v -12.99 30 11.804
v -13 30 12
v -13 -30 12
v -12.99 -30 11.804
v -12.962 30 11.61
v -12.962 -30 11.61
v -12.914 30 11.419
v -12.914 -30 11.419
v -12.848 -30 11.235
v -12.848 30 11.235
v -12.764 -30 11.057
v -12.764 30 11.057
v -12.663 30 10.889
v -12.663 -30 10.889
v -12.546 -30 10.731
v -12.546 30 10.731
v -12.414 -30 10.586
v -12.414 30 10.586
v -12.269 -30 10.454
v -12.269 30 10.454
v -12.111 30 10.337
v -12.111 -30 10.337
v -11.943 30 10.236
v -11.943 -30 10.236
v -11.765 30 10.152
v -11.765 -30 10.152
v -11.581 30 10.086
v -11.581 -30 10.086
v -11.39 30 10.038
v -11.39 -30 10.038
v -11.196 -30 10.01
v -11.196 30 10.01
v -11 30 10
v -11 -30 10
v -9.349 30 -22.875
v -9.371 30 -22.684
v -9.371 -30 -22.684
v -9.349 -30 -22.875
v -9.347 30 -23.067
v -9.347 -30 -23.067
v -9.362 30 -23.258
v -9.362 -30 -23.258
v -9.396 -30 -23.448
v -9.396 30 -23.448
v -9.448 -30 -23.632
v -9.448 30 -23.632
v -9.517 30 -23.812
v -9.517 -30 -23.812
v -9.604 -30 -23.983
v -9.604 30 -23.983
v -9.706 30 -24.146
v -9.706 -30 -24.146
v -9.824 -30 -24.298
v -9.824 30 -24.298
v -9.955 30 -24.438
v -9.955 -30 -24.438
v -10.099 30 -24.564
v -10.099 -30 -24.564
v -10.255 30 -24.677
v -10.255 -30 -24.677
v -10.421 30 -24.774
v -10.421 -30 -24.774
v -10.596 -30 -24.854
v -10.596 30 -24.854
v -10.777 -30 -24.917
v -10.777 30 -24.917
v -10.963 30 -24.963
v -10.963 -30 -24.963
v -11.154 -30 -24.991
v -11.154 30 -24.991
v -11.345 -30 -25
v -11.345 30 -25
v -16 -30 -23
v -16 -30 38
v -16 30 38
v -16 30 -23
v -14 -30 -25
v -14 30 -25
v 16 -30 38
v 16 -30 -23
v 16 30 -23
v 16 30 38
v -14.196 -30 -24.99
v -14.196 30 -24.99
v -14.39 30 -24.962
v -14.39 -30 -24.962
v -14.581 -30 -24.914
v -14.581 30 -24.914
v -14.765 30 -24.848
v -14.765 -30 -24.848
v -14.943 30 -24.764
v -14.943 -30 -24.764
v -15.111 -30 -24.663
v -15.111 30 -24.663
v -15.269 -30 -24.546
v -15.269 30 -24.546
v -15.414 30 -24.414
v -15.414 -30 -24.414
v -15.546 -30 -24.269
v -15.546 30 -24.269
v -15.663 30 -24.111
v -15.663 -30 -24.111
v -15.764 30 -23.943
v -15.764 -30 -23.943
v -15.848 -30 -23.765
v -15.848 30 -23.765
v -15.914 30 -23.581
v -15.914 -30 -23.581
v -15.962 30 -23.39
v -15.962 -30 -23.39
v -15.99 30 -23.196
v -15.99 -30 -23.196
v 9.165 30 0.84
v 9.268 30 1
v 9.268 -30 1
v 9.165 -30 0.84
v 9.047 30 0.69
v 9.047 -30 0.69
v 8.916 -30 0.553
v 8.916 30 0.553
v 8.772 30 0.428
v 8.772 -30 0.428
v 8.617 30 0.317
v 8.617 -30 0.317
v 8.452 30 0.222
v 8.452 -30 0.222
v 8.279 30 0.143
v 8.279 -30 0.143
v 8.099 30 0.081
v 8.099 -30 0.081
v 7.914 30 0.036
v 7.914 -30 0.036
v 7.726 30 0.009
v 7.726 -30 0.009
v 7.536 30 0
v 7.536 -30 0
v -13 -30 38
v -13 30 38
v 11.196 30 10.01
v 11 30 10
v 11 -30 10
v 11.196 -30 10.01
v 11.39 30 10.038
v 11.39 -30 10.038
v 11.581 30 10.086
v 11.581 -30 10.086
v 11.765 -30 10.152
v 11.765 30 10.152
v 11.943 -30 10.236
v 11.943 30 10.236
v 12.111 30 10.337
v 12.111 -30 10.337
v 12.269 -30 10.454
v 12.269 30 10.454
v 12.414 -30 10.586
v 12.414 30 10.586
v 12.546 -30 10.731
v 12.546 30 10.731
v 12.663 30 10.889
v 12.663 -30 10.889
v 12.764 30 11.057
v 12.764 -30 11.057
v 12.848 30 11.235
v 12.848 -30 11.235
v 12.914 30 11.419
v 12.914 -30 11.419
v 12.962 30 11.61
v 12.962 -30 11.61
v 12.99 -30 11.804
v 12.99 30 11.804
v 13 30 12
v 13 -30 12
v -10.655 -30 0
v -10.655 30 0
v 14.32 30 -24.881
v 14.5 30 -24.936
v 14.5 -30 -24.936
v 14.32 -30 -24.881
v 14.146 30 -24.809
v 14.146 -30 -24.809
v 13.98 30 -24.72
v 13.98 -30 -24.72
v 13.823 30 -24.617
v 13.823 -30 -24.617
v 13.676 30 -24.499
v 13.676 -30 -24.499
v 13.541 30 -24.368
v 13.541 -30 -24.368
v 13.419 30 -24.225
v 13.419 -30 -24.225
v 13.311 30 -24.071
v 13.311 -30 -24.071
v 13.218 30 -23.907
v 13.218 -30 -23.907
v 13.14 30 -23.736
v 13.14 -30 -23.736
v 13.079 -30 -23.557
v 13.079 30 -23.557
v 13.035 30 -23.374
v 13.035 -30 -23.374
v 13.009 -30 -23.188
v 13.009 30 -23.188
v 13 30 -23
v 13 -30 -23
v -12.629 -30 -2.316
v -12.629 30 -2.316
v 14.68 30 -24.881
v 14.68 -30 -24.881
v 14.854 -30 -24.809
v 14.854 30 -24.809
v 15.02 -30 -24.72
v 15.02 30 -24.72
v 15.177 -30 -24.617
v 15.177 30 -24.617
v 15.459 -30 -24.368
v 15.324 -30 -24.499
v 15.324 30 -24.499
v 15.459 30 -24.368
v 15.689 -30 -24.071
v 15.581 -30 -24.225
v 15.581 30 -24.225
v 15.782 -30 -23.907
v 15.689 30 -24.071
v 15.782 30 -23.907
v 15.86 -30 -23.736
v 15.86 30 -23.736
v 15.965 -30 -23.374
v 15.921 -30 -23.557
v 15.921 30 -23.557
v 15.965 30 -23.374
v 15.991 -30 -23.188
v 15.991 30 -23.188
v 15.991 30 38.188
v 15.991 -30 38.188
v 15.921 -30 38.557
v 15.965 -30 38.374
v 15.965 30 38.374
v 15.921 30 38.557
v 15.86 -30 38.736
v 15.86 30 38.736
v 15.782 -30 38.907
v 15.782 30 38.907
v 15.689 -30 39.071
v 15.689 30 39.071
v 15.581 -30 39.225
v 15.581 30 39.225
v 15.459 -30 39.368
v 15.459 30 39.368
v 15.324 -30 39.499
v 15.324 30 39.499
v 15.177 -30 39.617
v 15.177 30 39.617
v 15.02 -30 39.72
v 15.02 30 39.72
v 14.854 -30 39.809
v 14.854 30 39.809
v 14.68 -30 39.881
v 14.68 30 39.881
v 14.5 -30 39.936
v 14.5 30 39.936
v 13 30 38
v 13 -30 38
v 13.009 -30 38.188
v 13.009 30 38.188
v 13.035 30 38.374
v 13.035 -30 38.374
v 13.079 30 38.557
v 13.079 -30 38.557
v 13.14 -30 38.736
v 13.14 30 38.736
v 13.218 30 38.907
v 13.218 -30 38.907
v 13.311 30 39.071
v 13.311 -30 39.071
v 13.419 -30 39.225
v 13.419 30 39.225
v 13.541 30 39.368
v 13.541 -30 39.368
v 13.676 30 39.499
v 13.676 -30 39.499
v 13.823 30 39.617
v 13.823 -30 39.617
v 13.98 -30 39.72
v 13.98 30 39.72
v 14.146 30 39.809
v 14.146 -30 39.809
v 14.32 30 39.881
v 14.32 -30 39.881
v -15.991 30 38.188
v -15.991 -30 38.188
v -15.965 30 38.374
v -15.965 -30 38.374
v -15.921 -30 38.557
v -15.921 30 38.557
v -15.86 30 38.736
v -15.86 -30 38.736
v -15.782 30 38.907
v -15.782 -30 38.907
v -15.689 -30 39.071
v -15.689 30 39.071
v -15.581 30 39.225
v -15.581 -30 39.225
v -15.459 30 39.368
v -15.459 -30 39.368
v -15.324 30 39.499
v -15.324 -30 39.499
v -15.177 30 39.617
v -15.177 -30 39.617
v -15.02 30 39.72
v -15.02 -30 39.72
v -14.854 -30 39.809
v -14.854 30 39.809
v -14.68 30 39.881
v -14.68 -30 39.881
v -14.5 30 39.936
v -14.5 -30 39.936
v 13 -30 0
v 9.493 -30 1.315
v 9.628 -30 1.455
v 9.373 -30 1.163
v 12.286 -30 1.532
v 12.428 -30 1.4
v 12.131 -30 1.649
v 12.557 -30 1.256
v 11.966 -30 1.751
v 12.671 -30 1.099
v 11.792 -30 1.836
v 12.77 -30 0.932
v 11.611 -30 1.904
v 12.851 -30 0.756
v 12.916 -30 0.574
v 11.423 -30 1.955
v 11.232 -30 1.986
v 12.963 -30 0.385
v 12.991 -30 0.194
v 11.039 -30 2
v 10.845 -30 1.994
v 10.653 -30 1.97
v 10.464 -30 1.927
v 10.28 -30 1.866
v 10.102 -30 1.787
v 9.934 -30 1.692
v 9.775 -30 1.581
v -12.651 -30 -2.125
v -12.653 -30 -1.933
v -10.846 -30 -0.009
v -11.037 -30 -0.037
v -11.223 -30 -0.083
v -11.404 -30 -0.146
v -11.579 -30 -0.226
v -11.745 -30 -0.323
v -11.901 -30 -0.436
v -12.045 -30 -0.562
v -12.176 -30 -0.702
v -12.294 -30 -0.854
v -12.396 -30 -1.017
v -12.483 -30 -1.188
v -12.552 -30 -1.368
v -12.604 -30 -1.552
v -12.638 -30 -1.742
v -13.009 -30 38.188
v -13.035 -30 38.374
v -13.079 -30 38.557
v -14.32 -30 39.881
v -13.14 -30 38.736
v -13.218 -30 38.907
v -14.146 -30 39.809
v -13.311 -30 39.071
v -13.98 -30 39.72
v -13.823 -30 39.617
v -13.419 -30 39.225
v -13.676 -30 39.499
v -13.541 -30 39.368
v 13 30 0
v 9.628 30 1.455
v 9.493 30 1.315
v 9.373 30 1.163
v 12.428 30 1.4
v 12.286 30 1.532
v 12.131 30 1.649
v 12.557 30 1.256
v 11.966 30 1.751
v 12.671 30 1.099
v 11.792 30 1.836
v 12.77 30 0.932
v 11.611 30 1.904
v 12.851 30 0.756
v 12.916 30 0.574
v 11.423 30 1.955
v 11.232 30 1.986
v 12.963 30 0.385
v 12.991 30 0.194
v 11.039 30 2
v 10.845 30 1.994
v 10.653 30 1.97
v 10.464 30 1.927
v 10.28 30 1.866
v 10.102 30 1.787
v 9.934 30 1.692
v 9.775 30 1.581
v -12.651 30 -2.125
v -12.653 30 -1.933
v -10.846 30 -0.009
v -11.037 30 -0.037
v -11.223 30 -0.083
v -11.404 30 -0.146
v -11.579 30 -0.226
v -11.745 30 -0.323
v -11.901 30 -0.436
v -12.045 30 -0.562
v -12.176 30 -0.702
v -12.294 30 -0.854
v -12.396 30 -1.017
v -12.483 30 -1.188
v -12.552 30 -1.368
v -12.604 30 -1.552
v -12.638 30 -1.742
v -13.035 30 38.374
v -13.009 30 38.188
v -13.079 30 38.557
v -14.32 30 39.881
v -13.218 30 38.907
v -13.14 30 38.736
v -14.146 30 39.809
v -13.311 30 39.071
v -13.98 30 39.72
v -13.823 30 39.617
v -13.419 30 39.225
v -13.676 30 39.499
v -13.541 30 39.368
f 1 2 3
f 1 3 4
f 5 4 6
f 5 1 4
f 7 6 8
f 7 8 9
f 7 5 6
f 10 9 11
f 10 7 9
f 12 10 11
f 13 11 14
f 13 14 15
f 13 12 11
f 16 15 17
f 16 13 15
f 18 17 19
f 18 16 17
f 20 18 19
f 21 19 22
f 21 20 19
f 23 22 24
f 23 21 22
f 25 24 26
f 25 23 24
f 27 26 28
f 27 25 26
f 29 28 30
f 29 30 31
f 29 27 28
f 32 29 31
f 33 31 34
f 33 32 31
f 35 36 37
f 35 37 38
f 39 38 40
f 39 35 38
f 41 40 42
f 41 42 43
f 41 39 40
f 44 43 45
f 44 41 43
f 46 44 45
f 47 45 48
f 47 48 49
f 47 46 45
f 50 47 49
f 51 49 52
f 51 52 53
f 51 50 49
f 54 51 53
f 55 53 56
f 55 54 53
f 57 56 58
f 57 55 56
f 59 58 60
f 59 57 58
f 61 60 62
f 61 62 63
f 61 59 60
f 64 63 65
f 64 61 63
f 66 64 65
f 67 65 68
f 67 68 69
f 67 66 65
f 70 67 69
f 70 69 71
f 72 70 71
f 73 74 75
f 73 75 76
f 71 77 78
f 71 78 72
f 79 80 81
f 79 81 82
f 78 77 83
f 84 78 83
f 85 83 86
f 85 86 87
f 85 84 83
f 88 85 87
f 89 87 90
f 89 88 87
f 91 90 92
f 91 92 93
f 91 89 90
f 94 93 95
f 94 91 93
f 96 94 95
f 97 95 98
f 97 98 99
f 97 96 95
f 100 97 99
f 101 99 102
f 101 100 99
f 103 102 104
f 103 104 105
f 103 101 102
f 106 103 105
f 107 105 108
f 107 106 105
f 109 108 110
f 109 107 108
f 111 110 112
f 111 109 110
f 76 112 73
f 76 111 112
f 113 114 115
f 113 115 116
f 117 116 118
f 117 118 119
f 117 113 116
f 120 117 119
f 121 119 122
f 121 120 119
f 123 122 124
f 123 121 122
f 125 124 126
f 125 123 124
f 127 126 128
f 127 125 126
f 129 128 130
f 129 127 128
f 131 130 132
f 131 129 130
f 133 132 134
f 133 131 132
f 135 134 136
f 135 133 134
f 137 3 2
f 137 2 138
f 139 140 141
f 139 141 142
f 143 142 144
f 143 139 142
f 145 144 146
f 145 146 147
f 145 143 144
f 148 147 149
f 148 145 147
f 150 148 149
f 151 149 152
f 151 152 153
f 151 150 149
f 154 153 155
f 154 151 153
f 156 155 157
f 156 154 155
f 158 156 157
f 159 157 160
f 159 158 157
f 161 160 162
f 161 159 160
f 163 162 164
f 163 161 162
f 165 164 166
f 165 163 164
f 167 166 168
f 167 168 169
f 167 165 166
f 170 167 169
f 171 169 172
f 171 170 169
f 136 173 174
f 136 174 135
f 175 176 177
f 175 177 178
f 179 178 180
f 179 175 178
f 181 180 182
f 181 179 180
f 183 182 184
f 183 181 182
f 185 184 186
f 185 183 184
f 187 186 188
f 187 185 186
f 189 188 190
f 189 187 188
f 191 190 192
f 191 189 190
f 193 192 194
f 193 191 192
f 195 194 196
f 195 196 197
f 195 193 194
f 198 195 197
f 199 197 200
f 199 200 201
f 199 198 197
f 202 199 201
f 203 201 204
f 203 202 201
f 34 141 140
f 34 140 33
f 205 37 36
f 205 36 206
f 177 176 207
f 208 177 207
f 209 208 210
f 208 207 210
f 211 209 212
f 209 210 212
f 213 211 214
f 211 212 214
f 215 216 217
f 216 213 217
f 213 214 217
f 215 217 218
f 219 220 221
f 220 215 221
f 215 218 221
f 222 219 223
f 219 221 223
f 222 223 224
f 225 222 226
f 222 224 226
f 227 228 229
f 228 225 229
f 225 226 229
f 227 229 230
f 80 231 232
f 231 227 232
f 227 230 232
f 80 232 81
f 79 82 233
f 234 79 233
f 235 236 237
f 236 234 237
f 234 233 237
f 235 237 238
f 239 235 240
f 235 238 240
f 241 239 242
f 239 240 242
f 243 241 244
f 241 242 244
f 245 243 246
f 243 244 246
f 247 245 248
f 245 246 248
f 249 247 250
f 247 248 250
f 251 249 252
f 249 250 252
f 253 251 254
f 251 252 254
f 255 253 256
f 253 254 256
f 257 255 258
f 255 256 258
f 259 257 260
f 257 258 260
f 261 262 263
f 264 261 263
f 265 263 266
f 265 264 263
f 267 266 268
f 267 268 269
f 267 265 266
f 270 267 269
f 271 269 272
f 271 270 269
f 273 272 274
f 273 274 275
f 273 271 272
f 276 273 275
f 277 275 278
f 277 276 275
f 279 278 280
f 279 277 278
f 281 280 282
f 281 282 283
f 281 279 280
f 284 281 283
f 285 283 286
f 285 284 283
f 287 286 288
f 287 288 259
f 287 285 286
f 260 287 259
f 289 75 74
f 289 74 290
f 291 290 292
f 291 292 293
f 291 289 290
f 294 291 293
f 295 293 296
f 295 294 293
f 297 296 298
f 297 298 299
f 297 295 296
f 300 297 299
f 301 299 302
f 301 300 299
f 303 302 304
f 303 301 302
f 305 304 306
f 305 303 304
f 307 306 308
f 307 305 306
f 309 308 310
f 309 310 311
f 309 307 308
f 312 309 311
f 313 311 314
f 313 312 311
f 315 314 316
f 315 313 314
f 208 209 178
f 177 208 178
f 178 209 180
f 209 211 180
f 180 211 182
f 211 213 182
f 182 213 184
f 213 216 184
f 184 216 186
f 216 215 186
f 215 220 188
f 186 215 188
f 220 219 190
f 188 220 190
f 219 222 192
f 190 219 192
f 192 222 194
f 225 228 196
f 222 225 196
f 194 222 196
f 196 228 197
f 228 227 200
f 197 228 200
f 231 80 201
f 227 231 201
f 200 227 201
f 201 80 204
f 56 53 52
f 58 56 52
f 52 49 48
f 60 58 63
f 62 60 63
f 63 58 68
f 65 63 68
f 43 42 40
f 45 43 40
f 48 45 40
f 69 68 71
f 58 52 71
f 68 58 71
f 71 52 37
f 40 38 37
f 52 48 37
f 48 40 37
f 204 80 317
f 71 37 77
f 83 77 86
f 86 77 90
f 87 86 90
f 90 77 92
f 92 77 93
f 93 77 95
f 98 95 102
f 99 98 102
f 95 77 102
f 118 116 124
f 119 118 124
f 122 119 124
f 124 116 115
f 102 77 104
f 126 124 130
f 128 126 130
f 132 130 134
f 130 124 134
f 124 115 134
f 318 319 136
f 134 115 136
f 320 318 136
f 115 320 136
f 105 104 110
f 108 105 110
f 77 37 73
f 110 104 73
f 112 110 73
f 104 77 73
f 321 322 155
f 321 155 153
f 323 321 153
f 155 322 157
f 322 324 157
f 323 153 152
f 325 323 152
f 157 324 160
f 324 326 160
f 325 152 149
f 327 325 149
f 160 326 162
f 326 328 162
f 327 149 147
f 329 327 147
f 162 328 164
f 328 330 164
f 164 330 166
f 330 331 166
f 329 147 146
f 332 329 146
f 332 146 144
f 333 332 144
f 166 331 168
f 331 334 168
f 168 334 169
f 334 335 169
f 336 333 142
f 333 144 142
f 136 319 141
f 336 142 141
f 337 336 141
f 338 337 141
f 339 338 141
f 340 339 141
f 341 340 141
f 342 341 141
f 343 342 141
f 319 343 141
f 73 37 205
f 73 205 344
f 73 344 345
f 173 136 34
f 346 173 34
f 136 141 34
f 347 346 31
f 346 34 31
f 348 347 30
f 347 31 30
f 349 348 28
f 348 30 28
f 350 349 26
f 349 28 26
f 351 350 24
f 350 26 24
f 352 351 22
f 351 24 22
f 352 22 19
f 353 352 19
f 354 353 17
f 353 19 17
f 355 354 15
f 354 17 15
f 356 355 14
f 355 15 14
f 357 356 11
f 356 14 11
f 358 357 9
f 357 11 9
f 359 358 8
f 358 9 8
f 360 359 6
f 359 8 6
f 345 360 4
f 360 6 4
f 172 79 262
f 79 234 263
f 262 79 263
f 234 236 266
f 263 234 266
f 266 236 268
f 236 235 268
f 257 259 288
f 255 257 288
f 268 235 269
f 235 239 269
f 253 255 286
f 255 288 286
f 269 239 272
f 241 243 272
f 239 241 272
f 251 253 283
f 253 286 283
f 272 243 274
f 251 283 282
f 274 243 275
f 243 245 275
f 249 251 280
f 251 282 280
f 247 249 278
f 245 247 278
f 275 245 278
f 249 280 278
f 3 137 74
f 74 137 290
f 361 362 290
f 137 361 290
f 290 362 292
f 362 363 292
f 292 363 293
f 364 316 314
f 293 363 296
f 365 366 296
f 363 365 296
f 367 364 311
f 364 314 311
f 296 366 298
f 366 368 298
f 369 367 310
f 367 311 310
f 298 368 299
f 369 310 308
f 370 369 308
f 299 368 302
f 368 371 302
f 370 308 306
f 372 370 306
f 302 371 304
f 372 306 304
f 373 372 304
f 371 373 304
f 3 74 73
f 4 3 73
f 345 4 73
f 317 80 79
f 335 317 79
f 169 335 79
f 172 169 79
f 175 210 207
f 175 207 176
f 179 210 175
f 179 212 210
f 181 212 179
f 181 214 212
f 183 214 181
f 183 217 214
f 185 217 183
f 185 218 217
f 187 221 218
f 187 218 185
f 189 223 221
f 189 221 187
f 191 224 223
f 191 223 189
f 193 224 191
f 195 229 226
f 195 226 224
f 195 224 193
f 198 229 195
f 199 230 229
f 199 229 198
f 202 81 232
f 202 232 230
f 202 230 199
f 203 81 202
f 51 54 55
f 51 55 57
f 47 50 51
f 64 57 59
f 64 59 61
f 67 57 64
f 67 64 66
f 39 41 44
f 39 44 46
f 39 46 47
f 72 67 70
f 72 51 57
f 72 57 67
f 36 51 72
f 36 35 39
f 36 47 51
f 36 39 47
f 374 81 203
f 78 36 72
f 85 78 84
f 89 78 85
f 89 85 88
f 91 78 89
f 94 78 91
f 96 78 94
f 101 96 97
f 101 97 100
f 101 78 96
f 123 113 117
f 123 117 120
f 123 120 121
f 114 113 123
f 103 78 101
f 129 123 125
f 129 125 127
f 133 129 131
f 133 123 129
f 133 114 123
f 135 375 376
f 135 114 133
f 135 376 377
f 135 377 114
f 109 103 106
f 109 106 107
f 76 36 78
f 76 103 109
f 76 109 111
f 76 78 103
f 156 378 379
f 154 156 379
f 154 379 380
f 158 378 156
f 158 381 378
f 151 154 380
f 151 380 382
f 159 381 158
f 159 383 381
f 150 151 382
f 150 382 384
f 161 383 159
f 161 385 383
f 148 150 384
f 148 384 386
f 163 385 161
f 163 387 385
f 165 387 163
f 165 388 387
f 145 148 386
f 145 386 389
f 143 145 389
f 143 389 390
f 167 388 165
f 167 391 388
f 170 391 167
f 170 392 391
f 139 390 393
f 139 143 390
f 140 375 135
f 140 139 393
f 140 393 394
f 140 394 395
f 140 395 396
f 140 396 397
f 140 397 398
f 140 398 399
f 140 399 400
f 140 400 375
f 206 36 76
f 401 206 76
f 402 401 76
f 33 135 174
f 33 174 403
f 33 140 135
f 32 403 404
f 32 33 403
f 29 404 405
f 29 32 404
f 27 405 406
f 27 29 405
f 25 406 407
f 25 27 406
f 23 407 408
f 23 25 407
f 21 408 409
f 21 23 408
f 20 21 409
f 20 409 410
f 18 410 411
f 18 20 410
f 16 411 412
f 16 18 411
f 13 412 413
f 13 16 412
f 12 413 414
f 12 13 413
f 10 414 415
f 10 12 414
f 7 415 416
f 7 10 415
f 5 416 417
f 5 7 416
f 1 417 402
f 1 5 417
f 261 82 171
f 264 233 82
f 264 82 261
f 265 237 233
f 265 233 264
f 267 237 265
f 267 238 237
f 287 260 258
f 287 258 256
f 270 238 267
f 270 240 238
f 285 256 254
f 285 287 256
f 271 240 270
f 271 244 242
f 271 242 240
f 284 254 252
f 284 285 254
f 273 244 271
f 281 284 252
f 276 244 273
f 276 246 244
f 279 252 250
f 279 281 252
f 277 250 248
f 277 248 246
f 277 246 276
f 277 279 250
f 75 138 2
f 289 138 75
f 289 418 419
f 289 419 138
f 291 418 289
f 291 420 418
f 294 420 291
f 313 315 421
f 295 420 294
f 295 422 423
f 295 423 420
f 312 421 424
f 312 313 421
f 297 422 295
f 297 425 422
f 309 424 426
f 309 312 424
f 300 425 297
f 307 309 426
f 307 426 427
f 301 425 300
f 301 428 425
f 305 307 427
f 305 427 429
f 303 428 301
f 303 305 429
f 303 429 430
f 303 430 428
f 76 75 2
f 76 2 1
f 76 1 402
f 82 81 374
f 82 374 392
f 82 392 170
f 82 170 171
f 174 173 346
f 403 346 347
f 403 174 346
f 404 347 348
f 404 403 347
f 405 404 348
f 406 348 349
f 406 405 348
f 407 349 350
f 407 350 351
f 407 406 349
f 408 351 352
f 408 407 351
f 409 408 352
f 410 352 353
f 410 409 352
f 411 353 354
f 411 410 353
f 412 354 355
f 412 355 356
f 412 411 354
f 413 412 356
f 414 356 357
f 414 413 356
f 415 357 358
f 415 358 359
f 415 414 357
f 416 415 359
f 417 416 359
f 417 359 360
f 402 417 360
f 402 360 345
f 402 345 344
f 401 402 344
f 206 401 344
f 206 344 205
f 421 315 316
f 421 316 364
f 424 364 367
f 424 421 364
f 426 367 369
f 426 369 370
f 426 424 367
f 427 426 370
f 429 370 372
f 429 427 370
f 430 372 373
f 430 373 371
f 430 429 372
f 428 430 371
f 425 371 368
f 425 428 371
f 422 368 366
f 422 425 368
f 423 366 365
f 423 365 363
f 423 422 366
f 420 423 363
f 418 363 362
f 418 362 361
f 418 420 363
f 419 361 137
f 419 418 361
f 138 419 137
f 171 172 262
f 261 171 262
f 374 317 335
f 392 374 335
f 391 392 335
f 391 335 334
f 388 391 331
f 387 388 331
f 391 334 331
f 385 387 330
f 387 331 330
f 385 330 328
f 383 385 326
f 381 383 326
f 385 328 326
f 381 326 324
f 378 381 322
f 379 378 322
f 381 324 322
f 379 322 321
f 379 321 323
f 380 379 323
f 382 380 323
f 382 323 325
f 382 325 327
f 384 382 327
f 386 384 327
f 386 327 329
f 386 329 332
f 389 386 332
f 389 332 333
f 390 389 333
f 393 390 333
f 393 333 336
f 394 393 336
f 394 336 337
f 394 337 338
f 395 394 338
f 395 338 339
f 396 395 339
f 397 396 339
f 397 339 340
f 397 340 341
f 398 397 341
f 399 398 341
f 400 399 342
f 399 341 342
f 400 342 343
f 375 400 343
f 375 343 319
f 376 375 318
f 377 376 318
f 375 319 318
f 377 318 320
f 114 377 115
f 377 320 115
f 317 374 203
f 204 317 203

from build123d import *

# Parameters (mm, degrees)
F0_W        = 3
F0_H        = 30
F1_DEPTH    = 30
F3_DEPTH    = 60
F4_T1_DEPTH = 60
F4_T3_DEPTH = 71.7271911209
F4_T5_DEPTH = 70
F4_T7_DEPTH = 67.3205080757


# Not quite as in the source:
# - a fillet or chamfer that OpenCascade refuses, or shapes differently, is made with other operations: its cross-section is extruded or revolved along the edge and cut away or added


with BuildPart() as f1:
    # F0 (on Front) → F1 (new body, symmetric)
    with BuildSketch(Plane.XZ):
        Polygon((13, -25), (16, -25), (16, 10), (13, 10), (-13, 10), (-16, 10), (-16, -25), (-9, -25), (-13, 0), (13, 0), align=None)
        with Locations((-14.5, 25)):
            Rectangle(F0_W, F0_H)
        with Locations((14.5, 25)):
            Rectangle(F0_W, F0_H)
    extrude(amount=F1_DEPTH, both=True)

    # F2 (on face) → F3 (cut, through all)
    with BuildSketch(Plane.XZ.offset(30)):
        with BuildLine():
            Line((9, 0), (13, 0))
            ThreePointArc((13, 0), (11, 2), (9, 0))
        make_face()
    extrude(amount=-F3_DEPTH, mode=Mode.SUBTRACT)

    # F4: fillet of radius 2 on 13 edges, made by hand

    # F4_s2 → F4_t1 (join)
    with BuildSketch(Plane.XZ.offset(-30)):
        with BuildLine():
            ThreePointArc((-10.6545617758, 0), (-12.1763965245, -0.7023024244), (-12.6294430396, -2.3159810022))
            Line((-12.6294430396, -2.3159810022), (-13, 0))
            Line((-13, 0), (-10.6545617758, 0))
        make_face()
        with BuildLine():
            ThreePointArc((-13, 12), (-12.4142135624, 10.5857864376), (-11, 10))
            Line((-11, 10), (-13, 10))
            Line((-13, 10), (-13, 12))
        make_face()
        with BuildLine():
            ThreePointArc((11, 10), (12.4142135624, 10.5857864376), (13, 12))
            Line((13, 12), (13, 10))
            Line((13, 10), (11, 10))
        make_face()
    extrude(amount=F4_T1_DEPTH)

    # F4_s4 → F4_t3 (cut)
    with BuildSketch(Plane.XZ.offset(-35.8635955605)):
        with BuildLine():
            ThreePointArc((-9.3705569604, -22.6840189978), (-9.8236034755, -24.2976975756), (-11.3454382242, -25))
            Line((-11.3454382242, -25), (-9, -25))
            Line((-9, -25), (-9.3705569604, -22.6840189978))
        make_face()
    extrude(amount=F4_T3_DEPTH, mode=Mode.SUBTRACT)

    # F4_s6 → F4_t5 (cut)
    with BuildSketch(Plane.XZ.offset(-35)):
        with BuildLine():
            ThreePointArc((-14, -25), (-15.4142135624, -24.4142135624), (-16, -23))
            Line((-16, -23), (-16, -25))
            Line((-16, -25), (-14, -25))
        make_face()
        with BuildLine():
            ThreePointArc((14, -25), (15.4142135624, -24.4142135624), (16, -23))
            Line((16, -23), (16, -25))
            Line((16, -25), (14, -25))
        make_face()
        with BuildLine():
            ThreePointArc((-15, 40), (-13.5857864376, 39.4142135624), (-13, 38))
            Line((-13, 38), (-13, 40))
            Line((-13, 40), (-15, 40))
        make_face()
        with BuildLine():
            ThreePointArc((-16, 38), (-15.4142135624, 39.4142135624), (-14, 40))
            Line((-14, 40), (-16, 40))
            Line((-16, 40), (-16, 38))
        make_face()
        with BuildLine():
            ThreePointArc((16, 38), (15.4142135624, 39.4142135624), (14, 40))
            Line((14, 40), (16, 40))
            Line((16, 40), (16, 38))
        make_face()
        with BuildLine():
            ThreePointArc((13, 38), (13.5857864376, 39.4142135624), (15, 40))
            Line((15, 40), (13, 40))
            Line((13, 40), (13, 38))
        make_face()
        with BuildLine():
            ThreePointArc((15, -25), (13.5857864376, -24.4142135624), (13, -23))
            Line((13, -23), (13, -25))
            Line((13, -25), (15, -25))
        make_face()
    extrude(amount=F4_T5_DEPTH, mode=Mode.SUBTRACT)

    # F4_s8 → F4_t7 (cut)
    with BuildSketch(Plane.XZ.offset(-33.6602540378)):
        with BuildLine():
            ThreePointArc((9.2679491924, 1), (8.5358983849, 0.2679491924), (7.5358983849, 0))
            Line((7.5358983849, 0), (9, 0))
            ThreePointArc((9, 0), (9.0681483474, 0.5176380902), (9.2679491924, 1))
        make_face()
    extrude(amount=F4_T7_DEPTH, mode=Mode.SUBTRACT)


solid = f1.part
